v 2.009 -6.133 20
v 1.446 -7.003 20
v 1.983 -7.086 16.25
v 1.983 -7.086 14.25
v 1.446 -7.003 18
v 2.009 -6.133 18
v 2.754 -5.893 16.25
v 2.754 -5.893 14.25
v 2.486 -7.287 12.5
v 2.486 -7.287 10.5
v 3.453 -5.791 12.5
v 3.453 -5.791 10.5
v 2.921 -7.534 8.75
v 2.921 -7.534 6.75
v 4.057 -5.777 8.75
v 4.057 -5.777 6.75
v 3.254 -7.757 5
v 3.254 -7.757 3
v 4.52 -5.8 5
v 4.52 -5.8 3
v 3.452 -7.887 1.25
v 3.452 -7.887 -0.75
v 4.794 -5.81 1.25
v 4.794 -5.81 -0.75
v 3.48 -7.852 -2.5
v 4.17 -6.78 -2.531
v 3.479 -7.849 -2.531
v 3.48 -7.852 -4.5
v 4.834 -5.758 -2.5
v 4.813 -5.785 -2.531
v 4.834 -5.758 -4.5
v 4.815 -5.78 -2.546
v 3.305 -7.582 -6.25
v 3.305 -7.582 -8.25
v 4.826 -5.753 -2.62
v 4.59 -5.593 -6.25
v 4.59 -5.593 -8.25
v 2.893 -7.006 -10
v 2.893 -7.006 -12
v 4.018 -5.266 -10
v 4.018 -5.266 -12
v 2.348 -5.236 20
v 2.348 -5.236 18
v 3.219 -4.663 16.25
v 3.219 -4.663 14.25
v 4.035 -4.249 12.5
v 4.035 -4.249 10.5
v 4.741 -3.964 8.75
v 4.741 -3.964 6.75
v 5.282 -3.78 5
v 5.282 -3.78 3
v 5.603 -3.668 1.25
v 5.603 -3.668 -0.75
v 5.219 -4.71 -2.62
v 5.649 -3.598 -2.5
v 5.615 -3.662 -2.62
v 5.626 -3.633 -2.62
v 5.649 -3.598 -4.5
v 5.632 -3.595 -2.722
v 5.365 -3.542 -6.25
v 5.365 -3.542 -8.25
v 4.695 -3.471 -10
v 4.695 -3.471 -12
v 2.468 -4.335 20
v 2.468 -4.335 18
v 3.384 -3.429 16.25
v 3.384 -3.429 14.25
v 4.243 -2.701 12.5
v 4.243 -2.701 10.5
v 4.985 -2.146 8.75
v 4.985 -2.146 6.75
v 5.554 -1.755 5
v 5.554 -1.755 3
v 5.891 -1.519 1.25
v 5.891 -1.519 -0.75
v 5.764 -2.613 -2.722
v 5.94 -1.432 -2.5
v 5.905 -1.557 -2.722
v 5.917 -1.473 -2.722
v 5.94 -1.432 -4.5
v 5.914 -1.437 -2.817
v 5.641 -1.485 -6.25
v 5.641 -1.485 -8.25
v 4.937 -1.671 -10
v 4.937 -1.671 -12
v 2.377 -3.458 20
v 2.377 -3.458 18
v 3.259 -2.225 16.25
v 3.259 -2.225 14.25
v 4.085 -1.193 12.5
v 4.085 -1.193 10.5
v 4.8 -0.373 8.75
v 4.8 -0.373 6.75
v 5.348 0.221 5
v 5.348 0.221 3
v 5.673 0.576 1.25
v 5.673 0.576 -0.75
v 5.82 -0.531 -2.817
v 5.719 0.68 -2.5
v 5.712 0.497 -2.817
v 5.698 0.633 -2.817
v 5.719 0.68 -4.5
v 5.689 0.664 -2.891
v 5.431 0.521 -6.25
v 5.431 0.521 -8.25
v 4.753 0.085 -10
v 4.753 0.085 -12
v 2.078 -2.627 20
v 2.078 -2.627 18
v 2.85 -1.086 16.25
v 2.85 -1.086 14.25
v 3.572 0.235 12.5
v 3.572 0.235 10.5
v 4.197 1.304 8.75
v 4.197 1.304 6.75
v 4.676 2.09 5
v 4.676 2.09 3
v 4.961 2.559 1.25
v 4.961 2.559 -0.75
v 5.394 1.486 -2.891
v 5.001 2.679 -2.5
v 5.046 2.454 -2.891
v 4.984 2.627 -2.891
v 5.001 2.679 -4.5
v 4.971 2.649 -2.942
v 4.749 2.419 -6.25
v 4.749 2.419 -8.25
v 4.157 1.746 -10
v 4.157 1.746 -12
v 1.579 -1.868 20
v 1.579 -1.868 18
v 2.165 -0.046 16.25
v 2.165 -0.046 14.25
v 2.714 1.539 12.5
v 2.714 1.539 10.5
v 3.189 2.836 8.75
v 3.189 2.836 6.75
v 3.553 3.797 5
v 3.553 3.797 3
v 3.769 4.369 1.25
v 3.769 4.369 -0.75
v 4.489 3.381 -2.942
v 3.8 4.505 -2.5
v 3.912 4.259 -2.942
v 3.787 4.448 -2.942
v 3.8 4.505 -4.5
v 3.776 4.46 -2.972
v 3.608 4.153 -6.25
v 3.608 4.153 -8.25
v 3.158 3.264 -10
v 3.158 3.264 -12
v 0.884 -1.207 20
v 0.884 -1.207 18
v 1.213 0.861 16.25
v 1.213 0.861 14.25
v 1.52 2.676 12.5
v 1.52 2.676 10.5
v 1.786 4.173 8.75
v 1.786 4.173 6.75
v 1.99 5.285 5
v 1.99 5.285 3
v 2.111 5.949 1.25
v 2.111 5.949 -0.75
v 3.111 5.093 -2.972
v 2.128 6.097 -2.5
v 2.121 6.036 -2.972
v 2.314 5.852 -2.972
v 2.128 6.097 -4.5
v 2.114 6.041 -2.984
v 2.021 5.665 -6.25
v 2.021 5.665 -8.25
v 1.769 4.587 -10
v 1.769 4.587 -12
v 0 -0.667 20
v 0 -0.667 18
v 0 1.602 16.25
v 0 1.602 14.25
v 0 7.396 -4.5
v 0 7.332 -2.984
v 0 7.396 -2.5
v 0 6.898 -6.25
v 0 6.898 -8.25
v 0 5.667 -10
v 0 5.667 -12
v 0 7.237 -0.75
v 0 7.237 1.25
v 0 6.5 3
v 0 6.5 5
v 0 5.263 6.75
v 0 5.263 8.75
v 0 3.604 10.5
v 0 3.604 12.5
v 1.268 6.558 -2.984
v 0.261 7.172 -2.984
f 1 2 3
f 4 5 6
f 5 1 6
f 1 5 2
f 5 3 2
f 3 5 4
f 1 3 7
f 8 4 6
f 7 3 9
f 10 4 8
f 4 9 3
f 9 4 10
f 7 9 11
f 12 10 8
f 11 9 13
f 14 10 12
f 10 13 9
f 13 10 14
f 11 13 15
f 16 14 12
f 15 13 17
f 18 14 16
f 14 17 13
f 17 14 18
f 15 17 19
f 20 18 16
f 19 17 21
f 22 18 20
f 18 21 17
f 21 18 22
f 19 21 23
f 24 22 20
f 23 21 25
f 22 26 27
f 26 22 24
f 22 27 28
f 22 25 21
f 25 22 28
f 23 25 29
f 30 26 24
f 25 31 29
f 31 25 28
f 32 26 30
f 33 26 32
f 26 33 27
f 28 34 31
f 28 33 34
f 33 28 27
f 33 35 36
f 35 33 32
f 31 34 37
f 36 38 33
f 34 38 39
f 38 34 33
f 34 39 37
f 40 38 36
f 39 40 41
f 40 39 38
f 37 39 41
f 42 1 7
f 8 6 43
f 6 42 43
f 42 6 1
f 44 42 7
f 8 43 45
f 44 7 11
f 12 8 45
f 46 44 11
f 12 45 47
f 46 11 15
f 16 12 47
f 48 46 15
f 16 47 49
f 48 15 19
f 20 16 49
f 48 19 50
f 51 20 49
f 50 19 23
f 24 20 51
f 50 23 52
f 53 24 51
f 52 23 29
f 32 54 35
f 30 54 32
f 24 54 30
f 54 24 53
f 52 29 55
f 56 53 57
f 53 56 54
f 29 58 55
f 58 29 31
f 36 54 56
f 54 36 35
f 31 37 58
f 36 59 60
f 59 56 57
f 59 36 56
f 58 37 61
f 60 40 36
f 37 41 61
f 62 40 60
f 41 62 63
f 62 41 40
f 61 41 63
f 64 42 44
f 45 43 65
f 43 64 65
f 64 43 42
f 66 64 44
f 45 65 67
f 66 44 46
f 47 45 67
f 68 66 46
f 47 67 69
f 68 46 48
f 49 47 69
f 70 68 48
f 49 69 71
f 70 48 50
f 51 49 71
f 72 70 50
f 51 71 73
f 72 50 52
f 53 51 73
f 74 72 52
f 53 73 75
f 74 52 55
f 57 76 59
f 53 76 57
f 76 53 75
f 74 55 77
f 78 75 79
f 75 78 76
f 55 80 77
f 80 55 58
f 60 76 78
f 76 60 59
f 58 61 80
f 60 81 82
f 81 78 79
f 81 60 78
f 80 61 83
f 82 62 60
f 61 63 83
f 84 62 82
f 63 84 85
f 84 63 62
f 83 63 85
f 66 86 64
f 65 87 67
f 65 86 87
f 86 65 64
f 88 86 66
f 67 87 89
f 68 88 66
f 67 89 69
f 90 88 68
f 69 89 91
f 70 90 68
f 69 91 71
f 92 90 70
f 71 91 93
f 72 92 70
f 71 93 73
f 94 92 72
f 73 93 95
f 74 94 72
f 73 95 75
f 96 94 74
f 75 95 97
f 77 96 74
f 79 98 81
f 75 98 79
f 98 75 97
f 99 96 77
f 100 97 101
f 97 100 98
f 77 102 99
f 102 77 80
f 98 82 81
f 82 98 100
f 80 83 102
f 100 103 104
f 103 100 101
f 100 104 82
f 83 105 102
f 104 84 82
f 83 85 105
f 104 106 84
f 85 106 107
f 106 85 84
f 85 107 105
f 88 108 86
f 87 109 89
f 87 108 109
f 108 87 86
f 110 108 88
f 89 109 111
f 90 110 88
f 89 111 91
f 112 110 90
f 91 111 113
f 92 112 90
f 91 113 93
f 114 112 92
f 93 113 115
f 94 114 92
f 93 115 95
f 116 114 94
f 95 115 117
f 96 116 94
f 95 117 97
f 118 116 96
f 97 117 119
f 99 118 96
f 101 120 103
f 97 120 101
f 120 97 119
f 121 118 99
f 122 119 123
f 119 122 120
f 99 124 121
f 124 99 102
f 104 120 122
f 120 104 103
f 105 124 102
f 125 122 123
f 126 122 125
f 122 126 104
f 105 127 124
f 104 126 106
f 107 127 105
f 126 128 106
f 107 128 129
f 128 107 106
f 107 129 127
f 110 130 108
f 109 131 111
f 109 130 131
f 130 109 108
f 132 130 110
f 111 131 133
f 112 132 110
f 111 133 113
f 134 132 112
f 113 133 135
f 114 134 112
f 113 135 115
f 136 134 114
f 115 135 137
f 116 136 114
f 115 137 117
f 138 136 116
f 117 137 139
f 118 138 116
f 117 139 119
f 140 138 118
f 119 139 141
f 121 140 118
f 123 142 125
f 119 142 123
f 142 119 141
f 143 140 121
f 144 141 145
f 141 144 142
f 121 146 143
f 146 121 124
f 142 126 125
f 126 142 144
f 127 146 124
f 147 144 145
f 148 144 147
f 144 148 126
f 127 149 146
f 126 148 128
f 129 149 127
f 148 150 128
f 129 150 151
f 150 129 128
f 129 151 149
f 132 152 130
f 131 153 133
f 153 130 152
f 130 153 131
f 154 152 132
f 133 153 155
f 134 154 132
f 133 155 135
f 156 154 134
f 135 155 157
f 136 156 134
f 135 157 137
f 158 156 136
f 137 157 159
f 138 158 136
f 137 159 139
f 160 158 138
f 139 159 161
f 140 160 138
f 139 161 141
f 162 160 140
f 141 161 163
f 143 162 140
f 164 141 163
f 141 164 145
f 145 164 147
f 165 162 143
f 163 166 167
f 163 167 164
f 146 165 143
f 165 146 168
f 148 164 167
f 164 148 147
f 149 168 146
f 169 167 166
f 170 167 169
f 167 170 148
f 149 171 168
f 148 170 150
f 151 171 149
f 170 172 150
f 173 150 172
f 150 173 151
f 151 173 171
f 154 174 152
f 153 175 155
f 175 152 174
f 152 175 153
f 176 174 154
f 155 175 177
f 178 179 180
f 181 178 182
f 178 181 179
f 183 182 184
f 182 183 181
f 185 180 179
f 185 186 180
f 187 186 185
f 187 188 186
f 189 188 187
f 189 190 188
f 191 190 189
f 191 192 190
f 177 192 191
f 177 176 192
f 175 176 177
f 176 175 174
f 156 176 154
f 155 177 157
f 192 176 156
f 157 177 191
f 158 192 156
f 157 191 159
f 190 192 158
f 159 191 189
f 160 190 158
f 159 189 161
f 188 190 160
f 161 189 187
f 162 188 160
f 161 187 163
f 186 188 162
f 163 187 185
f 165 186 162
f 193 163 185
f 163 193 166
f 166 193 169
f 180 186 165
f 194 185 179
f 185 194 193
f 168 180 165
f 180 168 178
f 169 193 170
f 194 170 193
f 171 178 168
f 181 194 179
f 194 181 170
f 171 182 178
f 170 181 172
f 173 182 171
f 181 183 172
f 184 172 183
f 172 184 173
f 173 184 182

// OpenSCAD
// file: Renderer.scad
//===================================== 
// This is public Domain Code
// Contributed by: William A Adams
// 14 May 2011
//=====================================

include <maths.scad>

//=========================================
//
// 			Functions
//
//=========================================

function parseSeg(seg) = [ 
	seg[0], 
	LineRotations(seg[1]-seg[0]), 
	VMAG(seg[1]-seg[0])
	];

function GetPlaneVectors(points) = [points[2]-points[1],points[0]-points[1]];

function quad_translate(quad, trans) = [ 
	VSUM(quad[0], trans), 
	VSUM(quad[1], trans),
	VSUM(quad[2], trans),
	VSUM(quad[3], trans)];

//=========================================
//
// 			Core Modules
//
//=========================================
module PlaceLine(seg, radius=0.025) 
{
	params = parseSeg(seg);

	origin = params[0];
	rot = params[1];
	len = params[2];

	translate(origin)
	rotate(rot)
	cylinder(r=radius, h=len, $fn=12);
}

module DisplayQuadFrame(quad, radius=0.125) 
{
	PlaceLine([quad[0], quad[1]], radius);
	PlaceLine([quad[1], quad[2]], radius);
	PlaceLine([quad[2], quad[3]], radius);
	PlaceLine([quad[3], quad[0]], radius);
}

// Display a polyhedron with some thickness 
module DisplayTriShard(shard)
{
	polyhedron(
		points=[
			shard[0][0], shard[0][1],shard[0][2], // Top
			shard[1][0], shard[1][1], shard[1][2]], // Bottom
		triangles=[
			[0,2,1],
			[3,4,5],
			[1,5,4],
			[1,2,5],
			[2,3,5],
			[2,0,3],
			[0,4,3],
			[0,1,4]
			]);
}

module DisplayQuadShards( outerquad, innerquad ) 
{
	DisplayTriShard([[outerquad[0],outerquad[1],outerquad[2]],
		[innerquad[0], innerquad[1], innerquad[2]]]);

	DisplayTriShard([[outerquad[0],outerquad[2],outerquad[3]],
		[innerquad[0], innerquad[2], innerquad[3]]]);
}

//quad is an array of four points and an an array of four normals 
module DisplayQuadShard(quad, thickness=1, shownormals = false) 
{		
	inner = quad[0] + (quad[1]*thickness*-1);
	nradius = 0.5;
	nlen = 4;

	if (shownormals)
	{
		// Outward facing normal
		color([0,0,1])
		{
		PlaceLine([quad[0][0], quad[0][0]+(quad[1][0]*nlen)], radius=nradius);
		PlaceLine([quad[0][1], quad[0][1]+(quad[1][1]*nlen)], radius=nradius);
		PlaceLine([quad[0][2], quad[0][2]+(quad[1][2]*nlen)], radius=nradius);
		PlaceLine([quad[0][3], quad[0][3]+(quad[1][3]*nlen)], radius=nradius);
		}
		
		// Inner facing normal
		color([1,0,0])
		{
		PlaceLine([quad[0][0], quad[0][0]+(quad[1][0]*-nlen)], radius=nradius);
		PlaceLine([quad[0][1], quad[0][1]+(quad[1][1]*-nlen)], radius=nradius);
		PlaceLine([quad[0][2], quad[0][2]+(quad[1][2]*-nlen)], radius=nradius);
		PlaceLine([quad[0][3], quad[0][3]+(quad[1][3]*-nlen)], radius=nradius);
		}
	}
	
	//DisplayQuadFrame(quad[0]);
	//DisplayQuadFrame(inner);

	if( thickness < 0)
	{
		DisplayQuadShards(quad[0],quad[0] + quad[1]*thickness);
	}
	else
	{
		DisplayQuadShards(quad[0] + quad[1]*thickness,quad[0]);
	}
}


//========================================
//
//		Bezier Display Routines
//
//========================================
module DisplayBezControlFrame(mesh, radius=0.125) 
{
	for (row=[0:2])
		for (column=[0:2])
		{
			color([0,1,1])
			DisplayQuadFrame(GetControlQuad(mesh, [row,column]), radius);
		}
}

module linear_extrude_bezier(mesh, 
	colors=[[1,0,0],[1,1,0],[0,1,1],[0,0,1]], 
	steps=4, thickness=1, showControlFrame = false)
{
	if (showControlFrame)
		DisplayBezControlFrame(mesh);

	for (ustep = [0:steps-1])
	{
		for (vstep=[0:steps-1])
		{
			assign(ufrac1 = ustep/steps)
			assign(ufrac2 = (ustep+1)/steps)
			assign(vfrac1=vstep/steps)
			assign(vfrac2=(vstep+1)/steps)
			assign(outerquad = GetCurveQuad(mesh, [ufrac1,vfrac1], [ufrac2,vfrac2]))
			{
				assign(inner = quad_translate(outerquad, [0,0,-thickness]))

				color(berp(colors, vfrac1))
				DisplayQuadShards(outerquad, inner);
			}
		}
	}
}


module shell_extrude_bezier(mesh, 
	colors=[[1,0,0],[1,1,0],[0,1,1],[0,0,1]], 
	steps=4, thickness=1, showControlFrame = false, showNormals=false)
{
	if (showControlFrame)
		DisplayBezControlFrame(mesh);

	for (ustep = [0:steps-1])
	{
		for (vstep=[0:steps-1])
		{
			assign(ufrac1 = ustep/steps)
			assign(ufrac2 = (ustep+1)/steps)
			assign(vfrac1=vstep/steps)
			assign(vfrac2=(vstep+1)/steps)
			assign(quadandnorms = GetCurveQuadNormals(mesh, 
				[ufrac1,vfrac1], [ufrac2,vfrac2]))
			{
				color(berp(colors, vfrac1))
				DisplayQuadShard(quadandnorms, thickness, shownormals =showNormals);
			}
		}
	}
}

//========================================
//
//		Experimental Display Routines
//
//========================================
// This function will extrude a bezier solid from a bezier curve 
// It is a straight up prism
// c - ControlPoints
//
module BezFillet(c, focalPoint, 
	steps = 18, 
	height = 1,
	colors = [[1,0,0],[1,1,0],[0,1,1],[0,0,1]])
{
	for(step = [steps:1])
	{
//echo(PtOnBez(colors, step/steps));
		color(berp(colors, step/steps))
		linear_extrude(height = height, convexity = 3) 
		polygon(
			points=[
				focalPoint,
				PtOnBez2D(c[0], c[1], c[2],c[3], step/steps),
				PtOnBez2D(c[0], c[1], c[2],c[3], (step-1)/steps)],
			paths=[[0,1,2]]
		);
	}
}


//
// Name: BezRibbon
//
// Params:
//	c1 - First set of control points
//	c2 - Second set of control points
//	steps - Number of steps to evaluate along the curve
//	height - How thick the ribbon should be
//	colors - A bezier curve representing the color ramp
//
module linear_extrude_bez_ribbon(c1, c2, 
	steps=18, 
	height=1, 
	colors=[[1,0,0],[1,1,0],[0,1,1],[0,0,1]])
{
	for (step=[0:steps-1])
	{
		color(PtOnBez(colors, step/steps))
		linear_extrude(height = height, convexity = 10) 
		polygon(
			points=[
			PtOnBez2D(c1[0], c1[1], c1[2],c1[3], step/steps),
			PtOnBez2D(c2[0], c2[1], c2[2],c2[3], (step)/steps),
			PtOnBez2D(c2[0], c2[1], c2[2],c2[3], (step+1)/steps),
			PtOnBez2D(c1[0], c1[1], c1[2],c1[3], (step+1)/steps)],
			paths=[[0,1,2,3]]
			);

	}
}

module BezCubicRibbonRotate(c1, c2, steps=gSteps, height=gHeight, colors=[[1,0,0],[1,1,0],[0,1,1],[0,0,1]])
{
	for (step=[0:steps-1])
	{
		color(berp(colors, step/steps))
		rotate_extrude(convexity=3) 
		polygon(
			points=[
				PtOnBez2D(c1[0], c1[1], c1[2],c1[3], step/steps),
				PtOnBez2D(c2[0], c2[1], c2[2],c2[3], (step)/steps),
				PtOnBez2D(c2[0], c2[1], c2[2],c2[3], (step+1)/steps),
				PtOnBez2D(c1[0], c1[1], c1[2],c1[3], (step+1)/steps)],
		paths=[[0,1,2,3]]
		);
	}
}



module DisplayMeshControlFrame(mesh, radius=0.125) 
{
	for (row=[0:2])
		for (column=[0:2])
		{
			color([0,1,1])
			DisplayQuadFrame(GetControlQuad(mesh, [row,column]), radius);
		}
}

module bezierMeshSolid(mesh,
	colors=[[1,1,0],[1,1,0],[1,1,],[1,1,0]], 
	granuleSize = [1,1,1], 
	usteps=100, vsteps=100)
{
	for (ustep = [0:usteps])
	{
		for(vstep=[0:vsteps])
		{
			assign(ufrac = ustep/usteps)
			assign(vfrac = vstep/vsteps)
			assign(vpt = PtOnBezMesh(mesh, [ufrac,vfrac]))
			{
				//echo(vpt);
				translate([vpt[0], vpt[1], vpt[2]])
				cube(size=[1,1,vpt[2]]);
			}
		}
	}
}
// main file
//===================================== 
// This is public Domain Code
// Contributed by: William A Adams
// 25 May 2011
//=====================================

include <Renderer.scad>


cp1 = [[-25, -30,0], [-10, 20,0], [10,20,0], [25,-30,0]];
cp2 = [[-15, -25,7], [-7, 15,0], [7,15,0], [15,-25,7]];
cp3 = [[-15, -25,15], [-7, 15,0], [7,15,0], [15,-25,15]];
cp4 = [[-25, -30,25], [-10, 20,0], [10,20,0], [25,-30,25]];

gcp1 = [[0,0,0], [1,-1,0], [2,-1,0], [2.5,0.5,0]]; 
gcp2 = [[0,1,1], [1,1,2], [2,1,2], [3,1,1]]; 
gcp3 = [[0,2,1], [1,2,2], [2,2,2], [3,2,1]]; 
gcp4 = [[0,3,0], [1,4,0], [2,4,0], [3,3,0]]; 

fcp1 = [[0,0,0], [10,0,0], [20,0,0], [30,0,0]]; 
fcp2 = [[0,10,0], [10,10,0], [20,10,0], [30,10,0]]; 
fcp3 = [[0,20,0], [10,20,0], [20,20,0], [30,20,0]]; 
fcp4 = [[0,30,10], [10,30,10], [20,30,10], [30,30,10]]; 


surf1 = [[1.44628, -7.00323, 20.], [3.24976, -4.74174, 20.], [2.6061, -1.9217, 20.], [0., -0.666667, 20.], [-2.6061, -1.9217, 20.], [-3.24976, -4.74174, 20.], [-1.44628, -7.00323, 20.]];
surf2 = [[2.89256, -7.00646, 10.], [6.49952, -2.48347, 10.], [5.21221, 3.1566, 10.], [0., 5.66667, 10.], [-5.21221, 3.1566, 10.], [-6.49952, -2.48347, 10.], [-2.89256, -7.00646, 10.]];
surf3 = [[4.33884, -9.00969, 0.], [9.74928, -2.22521, 0.], [7.81831, 6.2349, 0.], [0., 10., 0.], [-7.81831, 6.2349, 0.], [-9.74928, -2.22521, 0.], [-4.33884, -9.00969, 0.]];
surf4 = [[2.89256, -7.00646, -10.], [6.49952, -2.48347, -10.], [5.21221, 3.1566, -10.], [0., 5.66667, -10.], [-5.21221, 3.1566, -10.], [-6.49952, -2.48347, -10.], [-2.89256, -7.00646, -10.]];
surf5 = [[1.44628, -7.00323, -20.], [3.24976, -4.74174, -20.], [2.6061, -1.9217, -20.], [0., -0.666667, -20.], [-2.6061, -1.9217, -20.], [-3.24976, -4.74174, -20.], [-1.44628, -7.00323, -20.]];


// This one does not do so well because it is 'vertical', so it folds
// on itself when doing a z-axis extrusion
// It cam be easily improved by laying out the vertices such that
// the z-axis extrusion is more clear
//linear_extrude_bezier([cp1,cp2,cp3,cp4], 
//	colors=[[1,0,0],[1,1,0],[0,1,1],[0,0,1]],
//	steps=16, thickness=2);


//This one does fine as it is mostly 'flat' with respect to the 
// x-y plane
//linear_extrude_bezier([gcp1,gcp2,gcp3,gcp4], 
//	colors=[[1,0,0],[1,1,0],[0,1,1],[0,0,1]],
//	steps=20, thickness = 2);
    
linear_extrude_bezier([surf1,surf2,surf3,surf4,surf5],
    colors=[[1,0,0],[1,1,0],[0,1,1],[0,0,1]],
    steps=8, thickness=2);


//shell_extrude_bezier([gcp1,gcp2,gcp3,gcp4], 
//	colors=[[1,0,0],[1,1,0],[0,1,1],[0,0,1]],
//	steps=4, thickness=0.25);

//shell_extrude_bezier([cp1,cp2,cp3,cp4], 
//	colors=[[1,0,0],[1,1,0],[0,1,1],[0,0,1]],
//	steps=3, thickness=4);

//shell_extrude_bezier([fcp1,fcp2,fcp3,fcp4], 
//	colors=[[1,0,0],[1,1,0],[0,1,1],[0,0,1]],
//	steps=6, thickness=-4);
